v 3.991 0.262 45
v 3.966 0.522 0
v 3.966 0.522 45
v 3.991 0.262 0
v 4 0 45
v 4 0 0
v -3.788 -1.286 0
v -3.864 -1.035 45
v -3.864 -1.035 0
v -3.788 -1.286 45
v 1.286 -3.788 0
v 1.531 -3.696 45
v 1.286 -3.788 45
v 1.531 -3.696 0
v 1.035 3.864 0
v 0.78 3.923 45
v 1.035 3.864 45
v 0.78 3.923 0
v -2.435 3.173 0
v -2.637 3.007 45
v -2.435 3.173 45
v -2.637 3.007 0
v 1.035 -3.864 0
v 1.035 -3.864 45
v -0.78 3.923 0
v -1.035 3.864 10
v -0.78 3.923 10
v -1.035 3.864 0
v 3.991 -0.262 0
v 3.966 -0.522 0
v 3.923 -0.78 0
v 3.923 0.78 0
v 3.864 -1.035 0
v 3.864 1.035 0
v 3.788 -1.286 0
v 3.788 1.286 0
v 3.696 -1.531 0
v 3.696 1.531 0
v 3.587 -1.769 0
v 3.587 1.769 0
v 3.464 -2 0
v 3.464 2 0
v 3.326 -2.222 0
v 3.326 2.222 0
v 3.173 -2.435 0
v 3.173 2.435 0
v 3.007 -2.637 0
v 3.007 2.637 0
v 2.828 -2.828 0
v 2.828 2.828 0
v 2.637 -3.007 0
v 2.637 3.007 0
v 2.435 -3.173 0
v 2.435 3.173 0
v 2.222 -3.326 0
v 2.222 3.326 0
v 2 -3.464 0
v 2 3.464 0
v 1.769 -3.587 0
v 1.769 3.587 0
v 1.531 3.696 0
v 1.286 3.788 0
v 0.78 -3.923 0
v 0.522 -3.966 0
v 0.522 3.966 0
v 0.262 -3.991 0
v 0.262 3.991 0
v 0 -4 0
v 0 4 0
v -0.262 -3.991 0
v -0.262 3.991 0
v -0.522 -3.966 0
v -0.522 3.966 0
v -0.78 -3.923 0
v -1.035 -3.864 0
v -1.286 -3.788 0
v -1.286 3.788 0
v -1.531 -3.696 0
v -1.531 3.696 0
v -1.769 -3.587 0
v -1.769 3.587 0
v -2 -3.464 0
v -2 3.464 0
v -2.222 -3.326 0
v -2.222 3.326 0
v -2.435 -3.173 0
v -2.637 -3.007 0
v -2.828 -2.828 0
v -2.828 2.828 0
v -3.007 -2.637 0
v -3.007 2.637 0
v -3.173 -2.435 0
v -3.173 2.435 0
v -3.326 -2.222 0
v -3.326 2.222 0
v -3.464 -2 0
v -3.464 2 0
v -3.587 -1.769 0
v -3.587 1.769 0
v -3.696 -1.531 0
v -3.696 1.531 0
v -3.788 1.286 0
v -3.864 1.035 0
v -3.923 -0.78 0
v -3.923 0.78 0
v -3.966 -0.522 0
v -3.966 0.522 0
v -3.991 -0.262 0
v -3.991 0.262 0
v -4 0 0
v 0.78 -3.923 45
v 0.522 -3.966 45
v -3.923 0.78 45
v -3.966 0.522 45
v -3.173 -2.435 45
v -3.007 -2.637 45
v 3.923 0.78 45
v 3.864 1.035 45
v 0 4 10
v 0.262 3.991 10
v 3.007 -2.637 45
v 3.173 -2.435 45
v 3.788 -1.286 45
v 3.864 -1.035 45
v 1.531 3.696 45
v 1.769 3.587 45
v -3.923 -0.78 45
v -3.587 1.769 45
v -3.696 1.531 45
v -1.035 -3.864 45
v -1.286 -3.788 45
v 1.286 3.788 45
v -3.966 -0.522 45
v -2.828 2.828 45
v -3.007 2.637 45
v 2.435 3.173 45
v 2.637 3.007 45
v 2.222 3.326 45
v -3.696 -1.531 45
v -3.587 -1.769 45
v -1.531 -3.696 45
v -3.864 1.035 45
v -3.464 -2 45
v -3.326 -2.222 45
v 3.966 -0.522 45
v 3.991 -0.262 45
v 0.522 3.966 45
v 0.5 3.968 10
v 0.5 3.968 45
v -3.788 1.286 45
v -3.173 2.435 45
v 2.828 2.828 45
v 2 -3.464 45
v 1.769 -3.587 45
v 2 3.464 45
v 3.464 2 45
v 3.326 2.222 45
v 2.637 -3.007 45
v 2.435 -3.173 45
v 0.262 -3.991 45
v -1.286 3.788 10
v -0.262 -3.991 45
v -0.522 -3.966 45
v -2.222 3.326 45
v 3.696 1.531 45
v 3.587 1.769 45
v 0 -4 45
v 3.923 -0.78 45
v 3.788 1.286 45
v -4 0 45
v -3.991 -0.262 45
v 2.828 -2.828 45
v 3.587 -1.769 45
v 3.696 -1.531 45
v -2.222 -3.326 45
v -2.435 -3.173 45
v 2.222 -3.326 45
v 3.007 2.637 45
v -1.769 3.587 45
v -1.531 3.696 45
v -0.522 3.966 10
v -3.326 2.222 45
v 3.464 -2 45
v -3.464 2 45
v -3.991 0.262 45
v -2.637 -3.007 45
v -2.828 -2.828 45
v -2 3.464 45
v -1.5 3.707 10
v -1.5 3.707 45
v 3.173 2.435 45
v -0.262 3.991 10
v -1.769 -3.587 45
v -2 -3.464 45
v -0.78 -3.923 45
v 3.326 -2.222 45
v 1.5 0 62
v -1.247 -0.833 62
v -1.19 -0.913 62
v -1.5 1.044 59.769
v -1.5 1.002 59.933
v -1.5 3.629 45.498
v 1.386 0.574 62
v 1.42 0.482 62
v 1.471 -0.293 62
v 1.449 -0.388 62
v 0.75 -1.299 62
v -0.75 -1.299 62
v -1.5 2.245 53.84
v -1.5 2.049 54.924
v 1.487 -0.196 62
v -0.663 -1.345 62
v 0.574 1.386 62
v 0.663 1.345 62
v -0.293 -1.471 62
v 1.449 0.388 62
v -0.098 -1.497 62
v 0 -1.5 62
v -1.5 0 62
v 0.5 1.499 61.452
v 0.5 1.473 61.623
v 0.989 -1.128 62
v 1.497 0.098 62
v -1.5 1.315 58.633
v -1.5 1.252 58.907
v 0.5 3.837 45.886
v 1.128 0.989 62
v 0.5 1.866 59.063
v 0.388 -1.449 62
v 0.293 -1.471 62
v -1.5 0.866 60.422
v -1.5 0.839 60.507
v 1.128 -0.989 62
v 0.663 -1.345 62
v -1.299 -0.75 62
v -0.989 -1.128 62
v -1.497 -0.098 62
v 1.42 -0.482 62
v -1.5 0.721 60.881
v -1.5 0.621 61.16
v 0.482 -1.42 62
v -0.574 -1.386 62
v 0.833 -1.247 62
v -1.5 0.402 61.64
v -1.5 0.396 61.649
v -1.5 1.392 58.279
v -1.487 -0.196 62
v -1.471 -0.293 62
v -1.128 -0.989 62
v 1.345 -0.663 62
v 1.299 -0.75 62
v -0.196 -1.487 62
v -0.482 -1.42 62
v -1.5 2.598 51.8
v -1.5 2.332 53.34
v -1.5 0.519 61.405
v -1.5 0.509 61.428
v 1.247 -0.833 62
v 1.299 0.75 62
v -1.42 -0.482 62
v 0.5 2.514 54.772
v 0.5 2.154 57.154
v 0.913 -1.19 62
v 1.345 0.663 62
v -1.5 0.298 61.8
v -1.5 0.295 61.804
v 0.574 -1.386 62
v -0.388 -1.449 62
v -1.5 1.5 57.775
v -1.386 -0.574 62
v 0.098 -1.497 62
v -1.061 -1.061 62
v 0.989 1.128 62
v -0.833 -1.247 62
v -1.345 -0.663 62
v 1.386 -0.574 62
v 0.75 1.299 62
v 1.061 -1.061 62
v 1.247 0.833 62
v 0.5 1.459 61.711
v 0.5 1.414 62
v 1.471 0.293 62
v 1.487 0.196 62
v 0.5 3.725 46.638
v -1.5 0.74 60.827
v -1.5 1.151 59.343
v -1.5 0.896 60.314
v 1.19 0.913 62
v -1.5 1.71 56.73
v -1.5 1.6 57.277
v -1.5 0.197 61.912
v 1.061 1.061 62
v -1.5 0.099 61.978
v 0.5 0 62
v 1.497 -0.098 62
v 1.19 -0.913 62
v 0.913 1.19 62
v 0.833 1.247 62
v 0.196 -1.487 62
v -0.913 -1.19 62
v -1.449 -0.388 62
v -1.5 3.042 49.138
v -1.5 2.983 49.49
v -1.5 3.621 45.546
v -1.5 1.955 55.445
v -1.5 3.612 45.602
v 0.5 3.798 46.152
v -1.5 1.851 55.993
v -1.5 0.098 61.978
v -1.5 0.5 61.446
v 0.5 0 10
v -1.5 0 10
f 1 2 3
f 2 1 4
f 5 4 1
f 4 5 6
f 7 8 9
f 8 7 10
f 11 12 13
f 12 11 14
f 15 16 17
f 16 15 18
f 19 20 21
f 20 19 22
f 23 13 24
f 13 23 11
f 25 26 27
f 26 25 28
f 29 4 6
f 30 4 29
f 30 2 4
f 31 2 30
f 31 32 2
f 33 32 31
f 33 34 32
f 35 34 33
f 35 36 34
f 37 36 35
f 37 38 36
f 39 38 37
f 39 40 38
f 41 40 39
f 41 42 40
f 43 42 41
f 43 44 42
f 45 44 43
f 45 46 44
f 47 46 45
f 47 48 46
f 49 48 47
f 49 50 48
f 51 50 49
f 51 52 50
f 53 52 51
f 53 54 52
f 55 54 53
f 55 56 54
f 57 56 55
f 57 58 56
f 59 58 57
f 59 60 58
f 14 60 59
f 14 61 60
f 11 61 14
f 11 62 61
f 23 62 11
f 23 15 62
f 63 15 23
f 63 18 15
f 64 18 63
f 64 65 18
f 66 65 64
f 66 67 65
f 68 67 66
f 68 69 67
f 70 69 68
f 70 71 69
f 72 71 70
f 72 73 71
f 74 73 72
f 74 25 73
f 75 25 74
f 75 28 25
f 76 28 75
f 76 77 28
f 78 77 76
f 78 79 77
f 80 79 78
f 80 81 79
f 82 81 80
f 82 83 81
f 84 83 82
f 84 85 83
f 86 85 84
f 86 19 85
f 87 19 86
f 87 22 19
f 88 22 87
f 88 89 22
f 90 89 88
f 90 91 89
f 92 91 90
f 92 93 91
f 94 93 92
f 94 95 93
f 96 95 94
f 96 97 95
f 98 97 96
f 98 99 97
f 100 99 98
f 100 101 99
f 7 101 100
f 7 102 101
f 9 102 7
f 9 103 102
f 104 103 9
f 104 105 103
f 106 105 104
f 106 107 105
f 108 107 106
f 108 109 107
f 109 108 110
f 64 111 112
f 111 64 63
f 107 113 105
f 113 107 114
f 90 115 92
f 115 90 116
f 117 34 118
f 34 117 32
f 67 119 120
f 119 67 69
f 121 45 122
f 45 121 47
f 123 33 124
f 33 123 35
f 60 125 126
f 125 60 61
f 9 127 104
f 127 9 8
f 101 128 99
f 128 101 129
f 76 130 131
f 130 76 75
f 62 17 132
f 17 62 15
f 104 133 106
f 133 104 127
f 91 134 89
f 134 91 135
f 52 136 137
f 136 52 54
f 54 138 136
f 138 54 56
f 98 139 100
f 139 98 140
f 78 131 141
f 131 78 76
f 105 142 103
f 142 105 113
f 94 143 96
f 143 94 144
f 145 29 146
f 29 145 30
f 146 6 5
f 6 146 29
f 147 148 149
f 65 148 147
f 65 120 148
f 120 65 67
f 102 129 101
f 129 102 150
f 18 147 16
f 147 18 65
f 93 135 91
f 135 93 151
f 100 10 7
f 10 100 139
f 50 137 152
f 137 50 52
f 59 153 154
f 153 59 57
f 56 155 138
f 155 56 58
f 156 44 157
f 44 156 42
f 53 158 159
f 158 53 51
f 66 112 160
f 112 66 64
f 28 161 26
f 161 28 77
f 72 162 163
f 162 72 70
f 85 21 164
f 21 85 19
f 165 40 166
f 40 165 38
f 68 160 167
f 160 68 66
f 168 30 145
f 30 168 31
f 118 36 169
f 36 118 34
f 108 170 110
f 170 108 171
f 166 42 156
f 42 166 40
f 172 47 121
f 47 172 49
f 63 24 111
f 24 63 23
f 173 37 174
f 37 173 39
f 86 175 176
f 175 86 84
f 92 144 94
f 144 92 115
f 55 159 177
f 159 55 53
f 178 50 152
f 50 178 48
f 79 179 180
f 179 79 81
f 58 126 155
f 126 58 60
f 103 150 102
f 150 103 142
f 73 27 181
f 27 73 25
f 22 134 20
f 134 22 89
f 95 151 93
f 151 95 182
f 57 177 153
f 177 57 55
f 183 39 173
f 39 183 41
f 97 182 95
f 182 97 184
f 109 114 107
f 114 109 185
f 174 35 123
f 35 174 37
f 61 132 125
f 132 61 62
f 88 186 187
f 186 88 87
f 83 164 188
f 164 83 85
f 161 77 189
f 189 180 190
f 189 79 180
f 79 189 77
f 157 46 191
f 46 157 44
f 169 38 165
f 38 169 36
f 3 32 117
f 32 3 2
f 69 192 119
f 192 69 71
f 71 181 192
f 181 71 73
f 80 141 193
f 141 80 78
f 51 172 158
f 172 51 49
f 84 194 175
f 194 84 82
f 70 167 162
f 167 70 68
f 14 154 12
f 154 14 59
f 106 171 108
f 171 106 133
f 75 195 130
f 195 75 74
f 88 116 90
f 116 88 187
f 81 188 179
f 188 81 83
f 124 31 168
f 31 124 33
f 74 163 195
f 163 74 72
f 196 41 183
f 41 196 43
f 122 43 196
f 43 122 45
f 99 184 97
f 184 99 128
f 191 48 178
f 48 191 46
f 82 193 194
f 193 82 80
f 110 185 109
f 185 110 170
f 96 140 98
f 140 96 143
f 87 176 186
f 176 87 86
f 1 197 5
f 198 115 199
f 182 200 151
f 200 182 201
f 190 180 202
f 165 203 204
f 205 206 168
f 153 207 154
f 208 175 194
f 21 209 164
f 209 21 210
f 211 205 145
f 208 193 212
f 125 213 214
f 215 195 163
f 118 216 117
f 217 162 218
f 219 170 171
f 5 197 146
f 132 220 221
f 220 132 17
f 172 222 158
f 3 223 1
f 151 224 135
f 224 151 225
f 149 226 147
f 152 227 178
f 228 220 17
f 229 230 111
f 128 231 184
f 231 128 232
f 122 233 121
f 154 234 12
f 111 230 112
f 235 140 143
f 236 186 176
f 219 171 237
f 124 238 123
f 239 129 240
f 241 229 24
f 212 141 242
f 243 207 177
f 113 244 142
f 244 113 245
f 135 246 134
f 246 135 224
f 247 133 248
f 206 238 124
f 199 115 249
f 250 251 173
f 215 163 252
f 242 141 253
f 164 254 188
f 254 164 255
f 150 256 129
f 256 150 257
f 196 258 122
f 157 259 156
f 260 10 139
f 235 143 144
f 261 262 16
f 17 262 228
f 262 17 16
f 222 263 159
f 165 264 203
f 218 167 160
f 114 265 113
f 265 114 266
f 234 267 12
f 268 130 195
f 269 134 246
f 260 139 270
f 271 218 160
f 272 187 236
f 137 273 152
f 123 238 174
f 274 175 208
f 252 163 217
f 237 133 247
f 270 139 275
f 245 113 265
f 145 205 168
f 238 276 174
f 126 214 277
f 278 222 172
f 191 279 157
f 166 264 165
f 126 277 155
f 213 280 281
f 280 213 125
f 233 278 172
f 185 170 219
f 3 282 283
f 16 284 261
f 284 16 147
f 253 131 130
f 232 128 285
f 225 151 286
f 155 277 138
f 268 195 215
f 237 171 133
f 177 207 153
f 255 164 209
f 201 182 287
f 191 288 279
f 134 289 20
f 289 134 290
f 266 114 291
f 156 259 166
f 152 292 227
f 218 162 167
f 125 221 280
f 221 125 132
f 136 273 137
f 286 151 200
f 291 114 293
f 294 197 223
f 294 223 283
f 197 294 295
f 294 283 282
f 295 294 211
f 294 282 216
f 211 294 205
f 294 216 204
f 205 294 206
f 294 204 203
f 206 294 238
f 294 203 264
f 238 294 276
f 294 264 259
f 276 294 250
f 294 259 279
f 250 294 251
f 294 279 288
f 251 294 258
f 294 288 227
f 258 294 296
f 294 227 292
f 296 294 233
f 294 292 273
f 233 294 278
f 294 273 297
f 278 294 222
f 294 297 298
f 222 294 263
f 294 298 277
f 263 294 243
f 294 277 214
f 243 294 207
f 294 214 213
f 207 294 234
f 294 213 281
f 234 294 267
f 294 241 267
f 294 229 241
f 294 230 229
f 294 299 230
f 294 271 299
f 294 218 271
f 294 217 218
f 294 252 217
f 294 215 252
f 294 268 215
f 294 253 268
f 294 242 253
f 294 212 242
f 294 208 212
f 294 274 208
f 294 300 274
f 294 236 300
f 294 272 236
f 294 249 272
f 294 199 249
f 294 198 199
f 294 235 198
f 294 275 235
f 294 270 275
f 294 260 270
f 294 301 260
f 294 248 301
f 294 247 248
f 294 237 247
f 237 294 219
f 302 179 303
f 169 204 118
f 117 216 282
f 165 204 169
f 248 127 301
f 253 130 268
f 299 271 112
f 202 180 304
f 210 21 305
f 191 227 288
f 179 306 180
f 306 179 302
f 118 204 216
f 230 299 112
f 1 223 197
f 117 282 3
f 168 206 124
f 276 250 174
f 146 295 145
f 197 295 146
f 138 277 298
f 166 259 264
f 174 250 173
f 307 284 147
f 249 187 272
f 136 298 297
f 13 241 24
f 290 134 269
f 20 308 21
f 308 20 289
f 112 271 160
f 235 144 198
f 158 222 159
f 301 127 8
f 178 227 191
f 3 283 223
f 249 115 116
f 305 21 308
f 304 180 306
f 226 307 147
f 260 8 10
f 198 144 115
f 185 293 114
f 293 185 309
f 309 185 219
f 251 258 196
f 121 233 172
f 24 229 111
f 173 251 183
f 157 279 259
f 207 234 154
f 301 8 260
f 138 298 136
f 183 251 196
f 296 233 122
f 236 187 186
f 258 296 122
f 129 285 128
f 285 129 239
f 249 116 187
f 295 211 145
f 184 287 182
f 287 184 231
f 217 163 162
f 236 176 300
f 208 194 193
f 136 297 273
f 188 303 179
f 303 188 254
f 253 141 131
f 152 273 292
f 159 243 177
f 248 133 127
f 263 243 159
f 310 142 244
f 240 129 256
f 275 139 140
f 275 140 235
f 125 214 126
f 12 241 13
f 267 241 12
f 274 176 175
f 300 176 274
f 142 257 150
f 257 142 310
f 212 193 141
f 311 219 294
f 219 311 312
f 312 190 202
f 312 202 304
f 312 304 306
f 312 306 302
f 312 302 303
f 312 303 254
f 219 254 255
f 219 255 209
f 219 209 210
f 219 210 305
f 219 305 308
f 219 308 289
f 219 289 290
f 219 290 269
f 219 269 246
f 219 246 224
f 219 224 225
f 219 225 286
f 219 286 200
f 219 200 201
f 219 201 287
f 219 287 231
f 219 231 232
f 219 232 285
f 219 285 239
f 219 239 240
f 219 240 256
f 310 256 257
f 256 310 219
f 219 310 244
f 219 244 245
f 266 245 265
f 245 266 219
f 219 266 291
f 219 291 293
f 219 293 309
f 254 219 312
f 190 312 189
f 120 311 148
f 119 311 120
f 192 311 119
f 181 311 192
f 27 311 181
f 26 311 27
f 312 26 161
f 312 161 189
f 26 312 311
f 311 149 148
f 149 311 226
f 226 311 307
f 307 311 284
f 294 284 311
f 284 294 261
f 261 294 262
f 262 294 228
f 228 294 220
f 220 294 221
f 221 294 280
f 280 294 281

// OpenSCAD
// Tissue-pestle for 1.5 mL microcentrifuge tubes
// Print orientation: standing upright on the bed (z = 0), centred on the origin in X and Y.
// Units: millimetres.

$fn = 96;

// ---- Dimensions ----
handle_d      = 8;    // handle diameter (also cone base diameter)
handle_h      = 45;   // handle height (z = 0 to z = 45)
cone_d        = 3;    // cone tip diameter (at z = 62)
cone_top_z    = 62;   // z where the cone meets the rounded tip
tip_d         = 3;    // rounded tip diameter (sphere)
tip_z         = 62;   // sphere centre height (z = cone_top_z)
groove_count  = 4;    // number of circumferential grooves on the handle
groove_w      = 2;    // groove width (in Z)
groove_depth  = 1;    // groove depth (in radial thickness / X)
groove_z      = [10, 15, 20, 25]; // groove centre heights
eps           = 0.5;  // overshoot for clean boolean cuts

// ---- Model ----
difference() {
    union() {
        // (1) Cylindrical handle
        cylinder(d = handle_d, h = handle_h);

        // (2) Tapering cone: 8 mm at z = 45 to 3 mm at z = 62
        translate([0, 0, handle_h])
            cylinder(d1 = handle_d, d2 = cone_d, h = cone_top_z - handle_h);

        // (3) Rounded tip: 3 mm diameter sphere centred at z = 62
        translate([0, 0, tip_z - tip_d / 2])
            sphere(d = tip_d);
    }

    // Grip grooves, cut fully through the handle wall
    for (g = [0 : groove_count - 1]) {
        rotate([0, 0, groove_z[g] < handle_h ? 90 : 0])
            translate([0, -eps, groove_z[g]])
                cube([handle_d / 2 + eps, groove_w, handle_h + 1]);
    }
}
